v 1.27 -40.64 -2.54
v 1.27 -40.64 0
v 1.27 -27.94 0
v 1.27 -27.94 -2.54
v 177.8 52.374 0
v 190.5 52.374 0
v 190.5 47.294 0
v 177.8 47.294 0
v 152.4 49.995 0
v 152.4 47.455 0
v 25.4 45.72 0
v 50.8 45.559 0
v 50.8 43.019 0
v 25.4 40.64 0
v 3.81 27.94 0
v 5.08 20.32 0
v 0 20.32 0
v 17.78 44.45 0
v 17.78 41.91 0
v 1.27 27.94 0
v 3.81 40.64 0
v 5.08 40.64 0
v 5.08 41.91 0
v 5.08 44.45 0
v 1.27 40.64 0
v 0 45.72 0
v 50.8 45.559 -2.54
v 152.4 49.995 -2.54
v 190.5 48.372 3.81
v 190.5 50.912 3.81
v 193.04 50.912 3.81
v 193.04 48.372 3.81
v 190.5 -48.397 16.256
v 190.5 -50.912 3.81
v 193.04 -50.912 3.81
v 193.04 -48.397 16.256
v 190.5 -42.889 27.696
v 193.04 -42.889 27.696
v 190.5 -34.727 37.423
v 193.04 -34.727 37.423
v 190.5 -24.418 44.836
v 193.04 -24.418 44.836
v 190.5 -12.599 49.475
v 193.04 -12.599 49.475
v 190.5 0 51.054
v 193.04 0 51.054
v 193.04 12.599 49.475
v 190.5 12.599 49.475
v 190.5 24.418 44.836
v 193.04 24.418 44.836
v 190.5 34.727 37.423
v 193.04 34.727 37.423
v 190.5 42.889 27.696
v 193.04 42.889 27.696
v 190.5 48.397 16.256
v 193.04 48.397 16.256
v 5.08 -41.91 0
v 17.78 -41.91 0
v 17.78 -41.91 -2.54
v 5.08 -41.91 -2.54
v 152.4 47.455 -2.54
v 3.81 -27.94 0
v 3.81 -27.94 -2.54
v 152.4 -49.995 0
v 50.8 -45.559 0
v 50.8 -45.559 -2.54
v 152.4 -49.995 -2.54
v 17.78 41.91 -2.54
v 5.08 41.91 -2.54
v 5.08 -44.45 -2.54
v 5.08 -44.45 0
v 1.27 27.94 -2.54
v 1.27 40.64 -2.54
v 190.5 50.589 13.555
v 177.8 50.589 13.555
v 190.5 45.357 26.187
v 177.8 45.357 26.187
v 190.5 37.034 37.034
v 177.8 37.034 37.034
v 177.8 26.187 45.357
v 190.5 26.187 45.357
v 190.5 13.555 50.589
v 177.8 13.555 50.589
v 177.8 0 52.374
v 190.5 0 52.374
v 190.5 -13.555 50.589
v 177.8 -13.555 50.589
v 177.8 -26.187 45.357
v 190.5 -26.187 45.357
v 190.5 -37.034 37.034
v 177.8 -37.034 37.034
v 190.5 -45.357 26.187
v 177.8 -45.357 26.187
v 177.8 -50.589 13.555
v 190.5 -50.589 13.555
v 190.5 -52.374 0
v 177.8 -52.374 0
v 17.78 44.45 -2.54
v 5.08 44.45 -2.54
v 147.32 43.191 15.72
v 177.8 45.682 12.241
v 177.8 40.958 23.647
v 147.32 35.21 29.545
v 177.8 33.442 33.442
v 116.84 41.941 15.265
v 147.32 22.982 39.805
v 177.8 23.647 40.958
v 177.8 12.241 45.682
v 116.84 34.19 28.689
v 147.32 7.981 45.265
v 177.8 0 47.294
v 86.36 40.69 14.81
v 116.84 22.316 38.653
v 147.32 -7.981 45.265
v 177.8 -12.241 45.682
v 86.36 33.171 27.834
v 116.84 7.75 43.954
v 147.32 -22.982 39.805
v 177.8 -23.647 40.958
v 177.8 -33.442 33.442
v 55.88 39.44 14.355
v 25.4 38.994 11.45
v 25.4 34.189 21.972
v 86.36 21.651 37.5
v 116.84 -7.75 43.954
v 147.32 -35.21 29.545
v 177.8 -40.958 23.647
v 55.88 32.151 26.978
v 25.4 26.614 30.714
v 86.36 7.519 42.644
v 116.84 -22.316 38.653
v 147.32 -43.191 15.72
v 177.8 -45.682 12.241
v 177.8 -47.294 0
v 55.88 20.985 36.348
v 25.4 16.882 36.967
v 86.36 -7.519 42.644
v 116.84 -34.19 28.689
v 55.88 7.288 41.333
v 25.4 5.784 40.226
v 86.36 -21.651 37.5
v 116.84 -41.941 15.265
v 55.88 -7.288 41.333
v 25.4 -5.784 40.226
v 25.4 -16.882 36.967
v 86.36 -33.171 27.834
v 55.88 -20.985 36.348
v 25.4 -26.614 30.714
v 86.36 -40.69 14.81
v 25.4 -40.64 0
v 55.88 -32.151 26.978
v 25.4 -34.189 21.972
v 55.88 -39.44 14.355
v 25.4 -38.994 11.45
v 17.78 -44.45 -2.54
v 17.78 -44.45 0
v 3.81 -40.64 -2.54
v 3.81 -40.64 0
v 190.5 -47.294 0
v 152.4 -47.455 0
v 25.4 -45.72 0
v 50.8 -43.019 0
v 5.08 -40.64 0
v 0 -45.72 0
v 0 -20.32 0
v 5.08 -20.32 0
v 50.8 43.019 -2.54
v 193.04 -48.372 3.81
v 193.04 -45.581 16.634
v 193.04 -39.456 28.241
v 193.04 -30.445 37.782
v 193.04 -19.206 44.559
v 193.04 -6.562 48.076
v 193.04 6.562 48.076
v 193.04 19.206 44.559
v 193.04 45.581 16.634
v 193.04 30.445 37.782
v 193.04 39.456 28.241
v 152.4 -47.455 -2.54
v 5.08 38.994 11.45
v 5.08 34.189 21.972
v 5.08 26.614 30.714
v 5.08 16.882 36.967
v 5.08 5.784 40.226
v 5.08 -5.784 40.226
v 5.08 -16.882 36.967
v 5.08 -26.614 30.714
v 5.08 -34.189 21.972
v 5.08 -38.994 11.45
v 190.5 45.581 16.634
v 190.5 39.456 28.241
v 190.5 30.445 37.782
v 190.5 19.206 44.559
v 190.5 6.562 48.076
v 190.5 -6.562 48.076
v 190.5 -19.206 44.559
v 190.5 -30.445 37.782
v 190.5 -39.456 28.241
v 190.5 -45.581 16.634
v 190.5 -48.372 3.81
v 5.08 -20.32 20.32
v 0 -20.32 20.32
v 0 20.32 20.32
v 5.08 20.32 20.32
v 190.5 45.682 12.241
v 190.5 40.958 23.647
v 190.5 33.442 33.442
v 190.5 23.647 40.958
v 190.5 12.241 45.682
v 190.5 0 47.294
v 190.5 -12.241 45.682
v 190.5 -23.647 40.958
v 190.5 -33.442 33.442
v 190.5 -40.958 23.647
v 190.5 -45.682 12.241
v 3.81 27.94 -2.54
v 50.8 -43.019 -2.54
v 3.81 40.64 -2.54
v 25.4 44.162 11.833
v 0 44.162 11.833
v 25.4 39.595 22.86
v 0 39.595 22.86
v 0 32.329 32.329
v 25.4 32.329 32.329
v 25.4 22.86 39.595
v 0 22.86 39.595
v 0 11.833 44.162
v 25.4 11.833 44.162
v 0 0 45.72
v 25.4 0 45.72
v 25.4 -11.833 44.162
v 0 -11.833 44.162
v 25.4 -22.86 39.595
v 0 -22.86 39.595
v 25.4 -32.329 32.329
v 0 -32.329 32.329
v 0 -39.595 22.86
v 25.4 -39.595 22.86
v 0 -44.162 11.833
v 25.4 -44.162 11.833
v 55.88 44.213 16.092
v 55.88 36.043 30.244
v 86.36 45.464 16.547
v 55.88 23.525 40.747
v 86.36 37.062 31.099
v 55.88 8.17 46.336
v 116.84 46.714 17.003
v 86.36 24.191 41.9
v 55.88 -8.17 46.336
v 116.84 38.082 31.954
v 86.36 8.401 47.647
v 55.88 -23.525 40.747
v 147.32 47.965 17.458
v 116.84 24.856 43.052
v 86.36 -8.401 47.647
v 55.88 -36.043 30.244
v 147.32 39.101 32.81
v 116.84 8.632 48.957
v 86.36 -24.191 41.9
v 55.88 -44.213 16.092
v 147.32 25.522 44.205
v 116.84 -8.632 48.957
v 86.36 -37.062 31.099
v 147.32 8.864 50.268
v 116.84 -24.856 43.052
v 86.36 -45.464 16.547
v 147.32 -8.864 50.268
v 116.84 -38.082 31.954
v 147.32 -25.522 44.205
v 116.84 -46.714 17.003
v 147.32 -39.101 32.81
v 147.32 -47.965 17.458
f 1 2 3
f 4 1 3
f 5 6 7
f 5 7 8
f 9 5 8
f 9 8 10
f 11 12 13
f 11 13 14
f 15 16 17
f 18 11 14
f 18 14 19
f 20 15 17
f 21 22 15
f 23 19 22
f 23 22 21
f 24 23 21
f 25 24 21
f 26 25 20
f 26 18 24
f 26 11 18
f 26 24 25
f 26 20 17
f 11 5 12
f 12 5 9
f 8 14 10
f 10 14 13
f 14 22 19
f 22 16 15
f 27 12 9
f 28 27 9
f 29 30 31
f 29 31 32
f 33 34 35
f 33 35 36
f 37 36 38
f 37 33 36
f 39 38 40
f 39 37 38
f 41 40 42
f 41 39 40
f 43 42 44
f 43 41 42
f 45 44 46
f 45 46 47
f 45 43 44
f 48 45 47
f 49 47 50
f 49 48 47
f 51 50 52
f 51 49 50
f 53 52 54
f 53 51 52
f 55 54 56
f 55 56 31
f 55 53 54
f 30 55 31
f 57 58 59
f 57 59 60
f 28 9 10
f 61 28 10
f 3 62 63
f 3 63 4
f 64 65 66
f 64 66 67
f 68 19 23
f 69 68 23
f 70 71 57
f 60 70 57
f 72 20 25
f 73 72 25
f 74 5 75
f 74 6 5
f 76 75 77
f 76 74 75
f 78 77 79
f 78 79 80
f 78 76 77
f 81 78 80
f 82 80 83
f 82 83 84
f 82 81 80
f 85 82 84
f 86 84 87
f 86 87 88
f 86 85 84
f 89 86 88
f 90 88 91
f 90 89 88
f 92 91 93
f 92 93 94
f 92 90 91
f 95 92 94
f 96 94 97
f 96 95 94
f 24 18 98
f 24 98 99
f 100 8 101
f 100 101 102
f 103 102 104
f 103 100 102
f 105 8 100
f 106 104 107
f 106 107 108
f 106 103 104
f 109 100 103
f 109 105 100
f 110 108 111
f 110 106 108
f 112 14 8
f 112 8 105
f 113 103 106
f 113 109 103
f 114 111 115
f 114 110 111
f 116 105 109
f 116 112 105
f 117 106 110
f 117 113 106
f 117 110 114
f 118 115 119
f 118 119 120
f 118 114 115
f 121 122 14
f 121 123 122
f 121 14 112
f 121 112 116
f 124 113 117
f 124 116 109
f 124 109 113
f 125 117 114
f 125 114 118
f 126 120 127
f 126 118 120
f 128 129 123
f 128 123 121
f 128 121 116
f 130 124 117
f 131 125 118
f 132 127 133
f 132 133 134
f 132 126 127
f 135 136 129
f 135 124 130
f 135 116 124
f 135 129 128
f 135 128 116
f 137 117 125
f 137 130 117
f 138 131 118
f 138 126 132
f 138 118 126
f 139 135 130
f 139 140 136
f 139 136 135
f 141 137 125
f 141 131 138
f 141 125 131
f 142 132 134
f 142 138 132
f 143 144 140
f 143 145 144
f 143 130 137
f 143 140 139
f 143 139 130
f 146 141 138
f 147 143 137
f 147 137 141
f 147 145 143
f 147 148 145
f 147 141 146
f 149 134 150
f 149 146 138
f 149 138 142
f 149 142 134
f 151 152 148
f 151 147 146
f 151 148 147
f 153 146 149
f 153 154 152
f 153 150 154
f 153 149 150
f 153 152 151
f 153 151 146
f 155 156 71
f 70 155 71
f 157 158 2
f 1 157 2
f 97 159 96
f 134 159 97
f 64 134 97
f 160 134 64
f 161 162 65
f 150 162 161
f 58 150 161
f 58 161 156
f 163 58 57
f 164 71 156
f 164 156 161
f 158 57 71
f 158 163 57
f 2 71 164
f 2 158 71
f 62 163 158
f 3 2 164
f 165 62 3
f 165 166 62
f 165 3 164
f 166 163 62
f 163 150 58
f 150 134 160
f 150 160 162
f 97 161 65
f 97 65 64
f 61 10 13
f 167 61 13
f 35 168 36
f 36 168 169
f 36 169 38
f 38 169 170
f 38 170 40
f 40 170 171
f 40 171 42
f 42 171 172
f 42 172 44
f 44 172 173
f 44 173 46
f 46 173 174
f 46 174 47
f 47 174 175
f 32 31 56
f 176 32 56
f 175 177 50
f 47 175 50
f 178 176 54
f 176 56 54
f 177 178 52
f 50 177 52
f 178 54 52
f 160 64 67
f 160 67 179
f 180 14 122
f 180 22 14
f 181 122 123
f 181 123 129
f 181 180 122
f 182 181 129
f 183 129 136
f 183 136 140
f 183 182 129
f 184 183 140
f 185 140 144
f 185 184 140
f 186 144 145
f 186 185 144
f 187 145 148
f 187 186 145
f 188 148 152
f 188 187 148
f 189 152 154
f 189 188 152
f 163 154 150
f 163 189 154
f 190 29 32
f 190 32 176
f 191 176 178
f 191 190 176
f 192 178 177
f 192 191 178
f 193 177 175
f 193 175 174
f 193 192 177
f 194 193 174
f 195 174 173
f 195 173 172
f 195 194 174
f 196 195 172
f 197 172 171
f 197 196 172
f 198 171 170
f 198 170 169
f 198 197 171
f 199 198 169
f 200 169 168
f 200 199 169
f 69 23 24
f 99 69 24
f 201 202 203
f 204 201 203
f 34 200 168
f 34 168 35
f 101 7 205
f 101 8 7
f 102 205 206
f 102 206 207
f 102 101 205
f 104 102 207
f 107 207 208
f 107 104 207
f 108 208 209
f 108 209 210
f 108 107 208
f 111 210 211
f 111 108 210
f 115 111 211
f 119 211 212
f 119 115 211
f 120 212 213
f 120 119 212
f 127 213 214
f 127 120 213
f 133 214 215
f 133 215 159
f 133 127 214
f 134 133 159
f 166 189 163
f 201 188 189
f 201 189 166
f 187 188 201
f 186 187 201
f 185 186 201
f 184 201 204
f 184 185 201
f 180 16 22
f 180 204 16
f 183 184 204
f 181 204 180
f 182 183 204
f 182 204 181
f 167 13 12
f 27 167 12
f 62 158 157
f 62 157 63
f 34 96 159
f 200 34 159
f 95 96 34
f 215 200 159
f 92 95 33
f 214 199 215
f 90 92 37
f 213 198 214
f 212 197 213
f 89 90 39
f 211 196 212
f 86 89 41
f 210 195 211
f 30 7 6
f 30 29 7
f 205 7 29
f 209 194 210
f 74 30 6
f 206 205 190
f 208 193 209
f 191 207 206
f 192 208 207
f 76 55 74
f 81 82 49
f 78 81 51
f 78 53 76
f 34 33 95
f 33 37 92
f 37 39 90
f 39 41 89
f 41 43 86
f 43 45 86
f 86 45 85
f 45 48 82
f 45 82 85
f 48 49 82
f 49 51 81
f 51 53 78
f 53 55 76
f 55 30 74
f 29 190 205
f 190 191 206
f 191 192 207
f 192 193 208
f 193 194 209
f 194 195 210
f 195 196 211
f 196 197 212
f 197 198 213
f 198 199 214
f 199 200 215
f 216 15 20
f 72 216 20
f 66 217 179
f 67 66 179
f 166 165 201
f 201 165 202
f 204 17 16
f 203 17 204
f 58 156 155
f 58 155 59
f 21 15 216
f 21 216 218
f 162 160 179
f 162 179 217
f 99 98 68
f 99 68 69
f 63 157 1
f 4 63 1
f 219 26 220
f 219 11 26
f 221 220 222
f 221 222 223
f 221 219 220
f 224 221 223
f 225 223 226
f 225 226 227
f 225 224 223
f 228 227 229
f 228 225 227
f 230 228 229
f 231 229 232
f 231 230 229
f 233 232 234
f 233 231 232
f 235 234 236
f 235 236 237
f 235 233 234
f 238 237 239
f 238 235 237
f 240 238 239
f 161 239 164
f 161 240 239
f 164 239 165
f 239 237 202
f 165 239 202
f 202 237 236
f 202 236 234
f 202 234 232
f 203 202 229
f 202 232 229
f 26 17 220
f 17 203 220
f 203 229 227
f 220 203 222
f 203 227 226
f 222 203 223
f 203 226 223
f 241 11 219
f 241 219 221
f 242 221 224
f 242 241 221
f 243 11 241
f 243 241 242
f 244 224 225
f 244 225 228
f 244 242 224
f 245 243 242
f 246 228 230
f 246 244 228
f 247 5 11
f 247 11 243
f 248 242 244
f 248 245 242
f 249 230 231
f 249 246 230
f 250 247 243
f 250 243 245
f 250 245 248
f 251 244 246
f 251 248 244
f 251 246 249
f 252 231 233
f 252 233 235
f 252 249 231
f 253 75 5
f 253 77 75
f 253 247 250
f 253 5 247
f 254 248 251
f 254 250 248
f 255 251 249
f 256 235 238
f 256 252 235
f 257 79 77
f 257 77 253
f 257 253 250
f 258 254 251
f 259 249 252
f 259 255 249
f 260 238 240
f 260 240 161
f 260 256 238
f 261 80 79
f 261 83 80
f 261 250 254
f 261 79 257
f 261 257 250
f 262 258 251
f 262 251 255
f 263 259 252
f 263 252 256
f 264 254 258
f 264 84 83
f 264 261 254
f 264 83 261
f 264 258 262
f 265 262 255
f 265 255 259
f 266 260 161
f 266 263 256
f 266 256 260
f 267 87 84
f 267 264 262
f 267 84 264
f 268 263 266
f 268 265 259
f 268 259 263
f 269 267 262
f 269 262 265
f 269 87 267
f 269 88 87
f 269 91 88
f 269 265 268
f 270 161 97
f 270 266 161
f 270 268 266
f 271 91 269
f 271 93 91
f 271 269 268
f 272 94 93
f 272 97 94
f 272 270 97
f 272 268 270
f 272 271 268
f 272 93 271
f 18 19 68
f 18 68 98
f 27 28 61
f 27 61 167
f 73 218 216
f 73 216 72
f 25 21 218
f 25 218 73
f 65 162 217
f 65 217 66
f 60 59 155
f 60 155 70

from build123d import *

# Parameters (mm, degrees)
REVOLVE2_ANGLE      = 180
SKETCH4_W           = 20.32
SKETCH4_H           = 20.32
CUT_EXTRUDE2_DEPTH  = 32.004
SKETCH5_W           = 2.54
SKETCH5_H           = 12.7
SKETCH5_W_2         = 12.7
SKETCH5_H_2         = 2.54
BOSS_EXTRUDE1_DEPTH = 2.54
BOSS_EXTRUDE2_DEPTH = 2.54


with BuildPart() as part:
    # Sketch2 → Revolve2 (revolve)
    with BuildSketch(Plane.XY):
        Polygon((0, 0), (0, 40.64), (0, 45.72), (25.4, 45.72), (177.8, 52.373927699), (190.5, 52.373927699), (190.5, 47.293927699), (177.8, 47.293927699), (25.4, 40.64), (5.08, 40.64), (5.08, 0), align=None)
    revolve(axis=Axis((0, 0, 0), (1, 0, 0)), revolution_arc=REVOLVE2_ANGLE)

    # Sketch4 → Cut-Extrude2 (cut)
    with BuildSketch(Plane.ZY):
        with Locations((10.16, 10.16)):
            Rectangle(SKETCH4_W, SKETCH4_H)
        with Locations((10.16, -10.16)):
            Rectangle(SKETCH4_W, SKETCH4_H)
    extrude(amount=-CUT_EXTRUDE2_DEPTH, mode=Mode.SUBTRACT)

    # Sketch5 → Boss-Extrude1 (add)
    with BuildSketch(Plane(origin=(0, 0, 0), x_dir=(-1, 0, 0), z_dir=(0, 0, -1))):
        with Locations((-2.54, 34.29)):
            Rectangle(SKETCH5_W, SKETCH5_H)
        Polygon((-152.4, 49.994939749), (-152.4, 47.454939749), (-50.8, 43.01898795), (-50.8, 45.55898795), align=None)
        with Locations((-11.43, 43.18)):
            Rectangle(SKETCH5_W_2, SKETCH5_H_2)
        Polygon((-50.8, -43.01898795), (-50.8, -45.55898795), (-152.4, -49.994939749), (-152.4, -47.454939749), align=None)
        with Locations((-11.43, -43.18)):
            Rectangle(SKETCH5_W_2, SKETCH5_H_2)
        with Locations((-2.54, -34.29)):
            Rectangle(SKETCH5_W, SKETCH5_H)
    extrude(amount=BOSS_EXTRUDE1_DEPTH)

    # Sketch6 → Boss-Extrude2 (add)
    with BuildSketch(Plane(origin=(190.5, 0, 0), x_dir=(0, 0, -1), z_dir=(1, 0, 0))):
        with BuildLine():
            Line((-3.81, 50.911637334), (-3.81, 48.371637334))
            ThreePointArc((-3.81, 48.371637334), (-48.52145297, 0), (-3.81, -48.371637334))
            Line((-3.81, -48.371637334), (-3.81, -50.911637334))
            ThreePointArc((-3.81, -50.911637334), (-51.054, 0), (-3.81, 50.911637334))
        make_face()
    extrude(amount=BOSS_EXTRUDE2_DEPTH)


solid = part.part
